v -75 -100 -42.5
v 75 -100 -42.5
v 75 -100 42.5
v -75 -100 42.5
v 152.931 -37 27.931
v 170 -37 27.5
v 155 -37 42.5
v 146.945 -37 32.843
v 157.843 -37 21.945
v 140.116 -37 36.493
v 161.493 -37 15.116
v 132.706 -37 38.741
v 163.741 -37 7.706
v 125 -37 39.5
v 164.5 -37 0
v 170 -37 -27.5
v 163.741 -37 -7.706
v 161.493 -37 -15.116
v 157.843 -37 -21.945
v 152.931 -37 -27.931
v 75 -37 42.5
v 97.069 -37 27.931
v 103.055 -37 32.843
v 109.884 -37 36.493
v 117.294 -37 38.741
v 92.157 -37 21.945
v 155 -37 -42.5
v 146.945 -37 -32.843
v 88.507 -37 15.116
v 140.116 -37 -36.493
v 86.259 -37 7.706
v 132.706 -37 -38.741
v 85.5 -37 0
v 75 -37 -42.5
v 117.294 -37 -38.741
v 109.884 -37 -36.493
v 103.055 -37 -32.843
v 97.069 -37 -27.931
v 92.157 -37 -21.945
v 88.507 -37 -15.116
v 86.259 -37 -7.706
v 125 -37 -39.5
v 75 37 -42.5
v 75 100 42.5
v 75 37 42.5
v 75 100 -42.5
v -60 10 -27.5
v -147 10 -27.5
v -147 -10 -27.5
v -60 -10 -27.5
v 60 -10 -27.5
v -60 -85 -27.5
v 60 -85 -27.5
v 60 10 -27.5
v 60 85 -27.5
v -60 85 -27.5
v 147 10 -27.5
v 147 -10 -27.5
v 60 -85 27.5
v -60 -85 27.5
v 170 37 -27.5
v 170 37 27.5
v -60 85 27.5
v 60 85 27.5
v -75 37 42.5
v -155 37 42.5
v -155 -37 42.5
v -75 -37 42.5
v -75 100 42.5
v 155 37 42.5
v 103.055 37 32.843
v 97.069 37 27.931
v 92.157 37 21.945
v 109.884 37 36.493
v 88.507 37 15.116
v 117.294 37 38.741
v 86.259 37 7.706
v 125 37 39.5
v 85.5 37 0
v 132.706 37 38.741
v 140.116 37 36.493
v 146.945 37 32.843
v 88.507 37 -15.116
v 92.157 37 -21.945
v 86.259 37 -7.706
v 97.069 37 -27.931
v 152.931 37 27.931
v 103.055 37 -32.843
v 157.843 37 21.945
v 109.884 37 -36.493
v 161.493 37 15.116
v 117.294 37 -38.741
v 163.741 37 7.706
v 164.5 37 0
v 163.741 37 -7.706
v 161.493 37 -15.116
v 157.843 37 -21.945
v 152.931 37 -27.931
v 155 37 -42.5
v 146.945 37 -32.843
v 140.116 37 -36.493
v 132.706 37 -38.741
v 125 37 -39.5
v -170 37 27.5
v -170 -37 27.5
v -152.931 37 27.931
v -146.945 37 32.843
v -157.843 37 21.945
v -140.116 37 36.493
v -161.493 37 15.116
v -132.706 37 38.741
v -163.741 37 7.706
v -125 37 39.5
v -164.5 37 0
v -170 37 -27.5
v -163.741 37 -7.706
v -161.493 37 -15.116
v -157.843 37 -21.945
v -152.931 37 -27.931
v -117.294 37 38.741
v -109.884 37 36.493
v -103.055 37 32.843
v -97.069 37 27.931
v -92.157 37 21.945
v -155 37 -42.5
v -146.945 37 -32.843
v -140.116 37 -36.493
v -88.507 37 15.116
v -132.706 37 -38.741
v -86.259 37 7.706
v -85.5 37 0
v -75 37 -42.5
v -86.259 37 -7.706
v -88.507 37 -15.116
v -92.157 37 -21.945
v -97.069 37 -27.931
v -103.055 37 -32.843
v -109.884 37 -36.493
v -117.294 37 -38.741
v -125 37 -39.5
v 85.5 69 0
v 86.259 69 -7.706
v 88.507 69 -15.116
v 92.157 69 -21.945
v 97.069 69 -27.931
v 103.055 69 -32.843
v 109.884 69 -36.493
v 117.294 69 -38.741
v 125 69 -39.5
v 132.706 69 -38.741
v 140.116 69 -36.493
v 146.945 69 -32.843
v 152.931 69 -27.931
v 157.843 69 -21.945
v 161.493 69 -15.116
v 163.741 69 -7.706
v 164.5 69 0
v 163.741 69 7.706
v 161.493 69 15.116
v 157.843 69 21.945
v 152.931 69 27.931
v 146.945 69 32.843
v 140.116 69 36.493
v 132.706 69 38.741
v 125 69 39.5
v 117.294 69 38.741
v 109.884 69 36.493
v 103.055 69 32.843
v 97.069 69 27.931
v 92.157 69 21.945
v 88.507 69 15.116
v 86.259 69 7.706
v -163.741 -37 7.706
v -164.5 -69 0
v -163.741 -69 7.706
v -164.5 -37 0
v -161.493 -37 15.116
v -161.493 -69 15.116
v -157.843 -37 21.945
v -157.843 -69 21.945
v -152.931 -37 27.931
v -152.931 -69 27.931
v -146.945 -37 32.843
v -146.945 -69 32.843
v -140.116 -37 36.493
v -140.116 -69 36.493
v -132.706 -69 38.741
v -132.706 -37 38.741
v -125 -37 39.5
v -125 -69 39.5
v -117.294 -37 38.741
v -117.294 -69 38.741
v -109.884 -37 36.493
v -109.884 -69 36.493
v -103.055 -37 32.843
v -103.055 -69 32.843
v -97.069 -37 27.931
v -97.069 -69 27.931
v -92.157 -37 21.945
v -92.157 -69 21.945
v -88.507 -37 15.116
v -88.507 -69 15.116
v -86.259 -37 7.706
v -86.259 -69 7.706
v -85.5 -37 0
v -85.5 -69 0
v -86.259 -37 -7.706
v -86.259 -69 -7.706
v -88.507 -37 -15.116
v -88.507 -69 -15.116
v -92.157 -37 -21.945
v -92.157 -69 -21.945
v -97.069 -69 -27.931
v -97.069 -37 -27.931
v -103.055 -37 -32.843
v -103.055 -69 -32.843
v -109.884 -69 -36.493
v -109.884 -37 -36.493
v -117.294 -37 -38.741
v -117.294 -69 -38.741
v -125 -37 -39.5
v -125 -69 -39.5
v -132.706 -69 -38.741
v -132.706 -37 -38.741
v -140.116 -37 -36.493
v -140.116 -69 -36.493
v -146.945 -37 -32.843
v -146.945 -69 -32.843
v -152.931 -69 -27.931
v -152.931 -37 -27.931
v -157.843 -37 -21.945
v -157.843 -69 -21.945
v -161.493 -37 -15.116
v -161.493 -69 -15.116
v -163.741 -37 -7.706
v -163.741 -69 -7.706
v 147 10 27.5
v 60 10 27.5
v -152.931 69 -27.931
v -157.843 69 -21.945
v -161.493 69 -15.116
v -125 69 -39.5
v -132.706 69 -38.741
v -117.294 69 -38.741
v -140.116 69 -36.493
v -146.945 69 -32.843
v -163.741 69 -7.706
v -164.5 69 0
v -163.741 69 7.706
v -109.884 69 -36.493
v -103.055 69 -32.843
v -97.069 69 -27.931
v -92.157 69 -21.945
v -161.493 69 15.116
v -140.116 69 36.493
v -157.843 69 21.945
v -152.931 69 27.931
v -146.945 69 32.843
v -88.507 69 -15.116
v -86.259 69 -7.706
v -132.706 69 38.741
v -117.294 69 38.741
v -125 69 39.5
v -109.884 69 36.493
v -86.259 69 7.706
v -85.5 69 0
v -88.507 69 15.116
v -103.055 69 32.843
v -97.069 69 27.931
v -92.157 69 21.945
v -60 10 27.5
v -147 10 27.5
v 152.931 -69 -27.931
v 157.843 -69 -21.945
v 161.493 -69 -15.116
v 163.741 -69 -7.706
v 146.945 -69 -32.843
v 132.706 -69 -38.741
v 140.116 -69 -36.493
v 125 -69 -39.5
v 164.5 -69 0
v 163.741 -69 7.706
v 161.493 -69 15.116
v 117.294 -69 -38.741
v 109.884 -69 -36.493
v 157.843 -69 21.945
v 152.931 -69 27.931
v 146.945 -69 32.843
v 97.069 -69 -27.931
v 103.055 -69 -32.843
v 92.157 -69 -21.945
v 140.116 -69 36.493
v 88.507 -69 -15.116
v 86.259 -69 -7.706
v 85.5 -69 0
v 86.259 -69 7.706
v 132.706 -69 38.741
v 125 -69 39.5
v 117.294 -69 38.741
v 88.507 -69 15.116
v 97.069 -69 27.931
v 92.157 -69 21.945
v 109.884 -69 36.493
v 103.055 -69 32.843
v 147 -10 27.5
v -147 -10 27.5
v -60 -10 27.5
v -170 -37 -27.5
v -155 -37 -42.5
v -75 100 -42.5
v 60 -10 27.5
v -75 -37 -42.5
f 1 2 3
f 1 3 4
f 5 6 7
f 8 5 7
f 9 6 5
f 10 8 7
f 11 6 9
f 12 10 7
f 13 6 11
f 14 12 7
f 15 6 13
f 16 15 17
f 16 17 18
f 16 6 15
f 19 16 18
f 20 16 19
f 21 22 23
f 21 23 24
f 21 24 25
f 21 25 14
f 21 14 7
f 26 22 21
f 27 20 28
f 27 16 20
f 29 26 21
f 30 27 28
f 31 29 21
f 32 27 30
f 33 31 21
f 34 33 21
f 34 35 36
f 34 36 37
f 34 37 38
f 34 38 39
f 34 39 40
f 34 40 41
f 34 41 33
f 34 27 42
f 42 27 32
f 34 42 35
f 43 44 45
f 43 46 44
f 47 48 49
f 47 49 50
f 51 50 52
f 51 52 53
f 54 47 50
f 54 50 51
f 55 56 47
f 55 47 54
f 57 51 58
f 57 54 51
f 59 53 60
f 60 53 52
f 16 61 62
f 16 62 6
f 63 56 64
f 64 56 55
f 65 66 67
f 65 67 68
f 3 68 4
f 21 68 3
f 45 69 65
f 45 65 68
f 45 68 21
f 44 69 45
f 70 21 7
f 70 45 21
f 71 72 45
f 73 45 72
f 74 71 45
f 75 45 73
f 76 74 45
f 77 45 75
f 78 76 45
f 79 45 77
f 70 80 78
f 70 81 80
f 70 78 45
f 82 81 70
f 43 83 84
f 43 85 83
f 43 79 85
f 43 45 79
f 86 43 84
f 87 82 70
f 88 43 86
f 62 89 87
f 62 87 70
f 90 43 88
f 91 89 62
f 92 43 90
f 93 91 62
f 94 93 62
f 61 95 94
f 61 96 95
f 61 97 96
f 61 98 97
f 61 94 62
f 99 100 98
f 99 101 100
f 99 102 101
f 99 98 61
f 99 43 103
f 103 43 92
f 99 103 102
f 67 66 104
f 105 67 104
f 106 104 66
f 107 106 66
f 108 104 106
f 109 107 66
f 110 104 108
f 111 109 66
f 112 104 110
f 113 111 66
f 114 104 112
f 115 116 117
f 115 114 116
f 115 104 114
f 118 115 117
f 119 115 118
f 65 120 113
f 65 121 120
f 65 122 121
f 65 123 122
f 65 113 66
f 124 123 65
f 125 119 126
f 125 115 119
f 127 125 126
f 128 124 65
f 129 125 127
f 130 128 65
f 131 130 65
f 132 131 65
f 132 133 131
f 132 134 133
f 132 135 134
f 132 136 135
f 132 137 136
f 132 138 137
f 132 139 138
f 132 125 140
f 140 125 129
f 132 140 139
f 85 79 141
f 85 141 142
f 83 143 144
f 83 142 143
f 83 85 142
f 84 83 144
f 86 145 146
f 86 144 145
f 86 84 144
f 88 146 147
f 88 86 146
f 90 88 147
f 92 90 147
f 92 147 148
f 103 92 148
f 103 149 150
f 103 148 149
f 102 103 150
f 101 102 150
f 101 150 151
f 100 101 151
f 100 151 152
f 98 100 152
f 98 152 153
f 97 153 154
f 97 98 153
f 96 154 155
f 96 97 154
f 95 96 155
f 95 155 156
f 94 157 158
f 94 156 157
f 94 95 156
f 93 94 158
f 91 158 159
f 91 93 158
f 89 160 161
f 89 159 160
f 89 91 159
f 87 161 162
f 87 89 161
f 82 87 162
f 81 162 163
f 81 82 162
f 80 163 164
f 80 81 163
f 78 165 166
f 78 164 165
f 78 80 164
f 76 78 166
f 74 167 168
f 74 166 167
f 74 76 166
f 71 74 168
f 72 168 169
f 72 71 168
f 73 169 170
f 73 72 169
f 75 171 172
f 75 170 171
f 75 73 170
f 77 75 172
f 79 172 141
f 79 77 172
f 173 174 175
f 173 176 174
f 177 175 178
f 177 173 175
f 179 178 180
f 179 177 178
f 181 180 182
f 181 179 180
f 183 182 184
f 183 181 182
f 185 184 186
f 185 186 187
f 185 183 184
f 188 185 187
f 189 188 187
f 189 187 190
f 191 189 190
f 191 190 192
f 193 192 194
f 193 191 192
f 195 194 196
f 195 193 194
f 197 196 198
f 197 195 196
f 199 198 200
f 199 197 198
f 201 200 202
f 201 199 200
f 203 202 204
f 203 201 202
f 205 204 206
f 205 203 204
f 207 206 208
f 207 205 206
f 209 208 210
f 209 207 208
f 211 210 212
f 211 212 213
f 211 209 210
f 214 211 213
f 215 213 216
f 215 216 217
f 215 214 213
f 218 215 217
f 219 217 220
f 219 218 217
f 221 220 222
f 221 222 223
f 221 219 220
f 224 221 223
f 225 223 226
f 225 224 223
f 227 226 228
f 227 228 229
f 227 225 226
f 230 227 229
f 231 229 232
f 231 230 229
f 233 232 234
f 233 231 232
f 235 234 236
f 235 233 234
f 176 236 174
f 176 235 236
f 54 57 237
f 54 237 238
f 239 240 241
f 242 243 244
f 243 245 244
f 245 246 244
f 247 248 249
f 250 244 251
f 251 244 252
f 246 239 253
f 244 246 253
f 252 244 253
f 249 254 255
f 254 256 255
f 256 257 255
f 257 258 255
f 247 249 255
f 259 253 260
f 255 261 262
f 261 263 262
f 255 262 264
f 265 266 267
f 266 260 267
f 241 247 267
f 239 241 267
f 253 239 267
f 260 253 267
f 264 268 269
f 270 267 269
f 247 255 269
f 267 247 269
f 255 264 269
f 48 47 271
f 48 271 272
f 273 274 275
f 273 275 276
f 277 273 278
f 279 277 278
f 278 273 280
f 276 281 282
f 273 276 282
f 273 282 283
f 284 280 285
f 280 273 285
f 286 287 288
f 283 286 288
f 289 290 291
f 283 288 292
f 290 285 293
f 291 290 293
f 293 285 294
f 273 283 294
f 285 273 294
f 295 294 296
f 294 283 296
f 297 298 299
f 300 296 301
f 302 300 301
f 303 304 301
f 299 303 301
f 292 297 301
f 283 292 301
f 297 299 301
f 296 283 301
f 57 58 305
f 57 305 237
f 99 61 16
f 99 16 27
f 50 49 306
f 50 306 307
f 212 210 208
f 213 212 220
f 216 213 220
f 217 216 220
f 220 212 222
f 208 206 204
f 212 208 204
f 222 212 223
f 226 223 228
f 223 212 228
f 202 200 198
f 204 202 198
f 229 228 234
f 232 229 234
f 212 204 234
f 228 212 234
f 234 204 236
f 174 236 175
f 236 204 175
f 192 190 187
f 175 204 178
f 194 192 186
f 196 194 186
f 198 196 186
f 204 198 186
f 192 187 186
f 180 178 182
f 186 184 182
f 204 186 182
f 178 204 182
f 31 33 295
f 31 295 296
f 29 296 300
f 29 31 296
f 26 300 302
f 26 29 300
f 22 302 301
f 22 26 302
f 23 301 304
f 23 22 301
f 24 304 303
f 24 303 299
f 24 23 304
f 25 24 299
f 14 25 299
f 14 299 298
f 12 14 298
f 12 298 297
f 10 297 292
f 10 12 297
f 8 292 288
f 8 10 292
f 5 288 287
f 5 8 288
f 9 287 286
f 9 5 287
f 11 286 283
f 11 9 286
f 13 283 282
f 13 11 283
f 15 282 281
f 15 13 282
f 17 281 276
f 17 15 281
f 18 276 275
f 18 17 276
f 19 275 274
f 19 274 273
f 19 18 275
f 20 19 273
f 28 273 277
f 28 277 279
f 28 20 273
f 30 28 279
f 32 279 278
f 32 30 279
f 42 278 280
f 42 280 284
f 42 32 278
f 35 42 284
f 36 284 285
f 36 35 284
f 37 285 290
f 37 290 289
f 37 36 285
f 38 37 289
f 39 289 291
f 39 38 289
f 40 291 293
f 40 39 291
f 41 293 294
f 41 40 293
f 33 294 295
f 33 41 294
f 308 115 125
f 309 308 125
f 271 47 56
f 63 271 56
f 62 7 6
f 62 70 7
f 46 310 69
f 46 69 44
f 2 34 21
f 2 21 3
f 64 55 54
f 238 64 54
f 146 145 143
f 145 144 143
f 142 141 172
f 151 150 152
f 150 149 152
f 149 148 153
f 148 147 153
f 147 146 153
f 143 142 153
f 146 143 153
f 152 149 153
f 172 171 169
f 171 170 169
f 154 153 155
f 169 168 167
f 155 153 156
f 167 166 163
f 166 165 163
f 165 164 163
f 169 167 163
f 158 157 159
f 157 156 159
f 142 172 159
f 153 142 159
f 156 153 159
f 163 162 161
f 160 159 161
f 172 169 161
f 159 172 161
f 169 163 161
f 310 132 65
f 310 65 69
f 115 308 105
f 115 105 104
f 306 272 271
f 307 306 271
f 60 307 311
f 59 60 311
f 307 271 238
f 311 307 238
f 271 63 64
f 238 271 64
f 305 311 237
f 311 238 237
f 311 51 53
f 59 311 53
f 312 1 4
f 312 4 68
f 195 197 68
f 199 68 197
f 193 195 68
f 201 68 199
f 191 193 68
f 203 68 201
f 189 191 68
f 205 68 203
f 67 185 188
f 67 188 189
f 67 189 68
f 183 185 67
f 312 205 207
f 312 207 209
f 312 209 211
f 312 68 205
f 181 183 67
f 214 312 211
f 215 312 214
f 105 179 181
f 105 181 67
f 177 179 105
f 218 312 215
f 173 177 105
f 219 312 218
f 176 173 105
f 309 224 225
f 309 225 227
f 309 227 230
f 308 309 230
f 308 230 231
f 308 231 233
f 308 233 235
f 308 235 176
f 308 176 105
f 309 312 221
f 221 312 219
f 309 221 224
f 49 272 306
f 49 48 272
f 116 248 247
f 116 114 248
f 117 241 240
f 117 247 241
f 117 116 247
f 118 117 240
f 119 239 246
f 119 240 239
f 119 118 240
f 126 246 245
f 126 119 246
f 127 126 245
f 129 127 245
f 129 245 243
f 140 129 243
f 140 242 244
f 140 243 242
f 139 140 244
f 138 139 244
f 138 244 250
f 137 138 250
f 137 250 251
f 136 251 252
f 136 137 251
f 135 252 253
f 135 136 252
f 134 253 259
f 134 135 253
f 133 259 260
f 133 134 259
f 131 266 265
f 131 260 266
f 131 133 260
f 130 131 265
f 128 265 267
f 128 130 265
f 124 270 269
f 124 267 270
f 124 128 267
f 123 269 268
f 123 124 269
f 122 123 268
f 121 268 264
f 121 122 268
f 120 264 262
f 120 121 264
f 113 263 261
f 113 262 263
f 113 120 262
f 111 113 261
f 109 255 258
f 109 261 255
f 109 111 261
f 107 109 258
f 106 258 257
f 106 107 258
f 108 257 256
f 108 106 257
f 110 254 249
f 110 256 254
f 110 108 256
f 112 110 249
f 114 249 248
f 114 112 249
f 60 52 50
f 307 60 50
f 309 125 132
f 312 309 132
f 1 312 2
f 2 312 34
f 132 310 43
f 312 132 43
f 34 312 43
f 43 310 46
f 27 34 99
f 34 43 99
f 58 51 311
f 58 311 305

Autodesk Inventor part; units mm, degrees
ref_plane "YZ Plane" through (0, 0, 0) normal (1, 0, 0) x (0, 1, 0)
ref_plane "XZ Plane" through (0, 0, 0) normal (0, 1, 0) x (-1, 0, 0)
ref_plane "XY Plane" through (0, 0, 0) normal (0, 0, 1) x (1, 0, 0)
sketch "Sketch4" plane through (0, 0, 0) normal (0, 0, 1) x (1, 0, 0)
  line L0 (75, -100) -> (-75, -100)
  line L1 (-75, -100) -> (-75, 100)
  line L2 (-75, 100) -> (75, 100)
  line L3 (75, 100) -> (75, -100)
  line L4 (75, -100) -> (-75, 100) construction
  line L5 (-75, -100) -> (75, 100) construction
  line L6 (170, -37) -> (-170, -37)
  line L7 (-170, -37) -> (-170, 37)
  line L8 (-170, 37) -> (170, 37)
  line L9 (170, 37) -> (170, -37)
  line L10 (170, -37) -> (-170, 37) construction
  line L11 (-170, -37) -> (170, 37) construction
  point P0 (0, 0)
  point P1 (0, 0)
  point P2 (0, 0)
  point P3 (75, 37)
  point P4 (-75, 37)
  point P5 (-75, -37)
  point P6 (75, -37)
  dimension "d17" = 74
  dimension "d18" = 340
  dimension "d19" = 150
  dimension "d20" = 200
extrude "Extrusion4" add sketch "Sketch4" along normal mid plane 85
sketch "Sketch5" plane through (0, 0, 0) normal (0, 1, 0) x (-1, 0, 0)
  circle A0 centre (-125, 0) radius 39.5
  circle A1 centre (125, 0) radius 39.5
  line L0 (75, 42.5) -> (-75, 42.5) construction
  line L1 (0, 42.5) -> (0, -42.5) construction
  line L2 (-75, -42.5) -> (75, -42.5) construction
  line L3 (-170, -42.5) -> (-170, 42.5) construction
  line L4 (-170, 0) -> (170, 0) construction
  line L5 (170, -42.5) -> (170, 42.5) construction
  circle A2 centre (-125, 0) radius 31.5
  circle A3 centre (125, 0) radius 31.5
  line L6 (-155, 42.5) -> (-170, 27.5)
  line L7 (-170, -27.5) -> (-155, -42.5)
  line L8 (-170, -42.5) -> (-75, -42.5) projected
  line L9 (170, 42.5) -> (75, 42.5) projected
  line L10 (155, 42.5) -> (170, 27.5)
  line L11 (170, -27.5) -> (155, -42.5)
  line L12 (-75, 42.5) -> (-170, 42.5) projected
  line L13 (75, -42.5) -> (170, -42.5) projected
  line L14 (-170, 42.5) -> (-170, -42.5)
  line L15 (170, 42.5) -> (170, -42.5)
  circle A4 centre (125, 0) radius 25
  circle A5 centre (-125, 0) radius 25
  point P0 (0, 0)
  point P1 (-170, -27.5)
  dimension "d23" = 79
  dimension "d24" = 250
  dimension "d39" = 63
  dimension "d42" = 15
  dimension "d43" = 45
  dimension "d47" = 50
extrude "Extrusion5" add sketch "Sketch5" against normal blind 32 from surface at -37 contours A0 | A1 | A2 | A3 | A4 | A5
sketch "Sketch6" plane through (0, 0, 0) normal (0, 0, 1) x (1, 0, 0)
  line L0 (147, 10) -> (-147, 10)
  line L1 (-147, 10) -> (-147, -10)
  line L2 (-147, -10) -> (147, -10)
  line L3 (147, -10) -> (147, 10)
  line L4 (147, 10) -> (-147, -10) construction
  line L5 (-147, 10) -> (147, -10) construction
  line L6 (-60, 85) -> (60, 85)
  line L7 (60, 85) -> (60, -85)
  line L8 (60, -85) -> (-60, -85)
  line L9 (-60, -85) -> (-60, 85)
  line L10 (-60, 85) -> (60, -85) construction
  line L11 (60, 85) -> (-60, -85) construction
  line L12 (75, -100) -> (-75, -100) projected
  line L13 (-75, 37) -> (-75, 100) projected
  line L14 (-170, -37) -> (-170, 37) projected
  line L15 (-75, -37) -> (-170, -37) projected
  point P0 (0, 0)
  point P1 (-60, -10)
  point P2 (60, -10)
  point P3 (60, 10)
  point P4 (-60, 10)
  dimension "d27" = 15
  dimension "d28" = 15
  dimension "d29" = 23
  dimension "d30" = 27
  dimension "d46" = 20
extrude "Extrusion6" cut sketch "Sketch6" along normal mid plane 55
extrude "Extrusion8" cut sketch "Sketch5" against normal through all both and the other way through all contours L7 L8 L14 | L6 L14 L12 | L15 L10 L9 | L15 L13 L11
mirror "Mirror1" about plane through (0, 0, 0) normal (0, 1, 0) of "Extrusion5"
equation "\"d21\" = body_thickness"
equation "\"d27\" = wall_thickness"
equation "\"d28\" = wall_thickness"
equation "\"d31\" = body_thickness - 2 * wall_thickness"
equation "\"wall_thickness\" = 15"
equation "\"body_thickness\" = 85"
properties part number "body_inventor"
